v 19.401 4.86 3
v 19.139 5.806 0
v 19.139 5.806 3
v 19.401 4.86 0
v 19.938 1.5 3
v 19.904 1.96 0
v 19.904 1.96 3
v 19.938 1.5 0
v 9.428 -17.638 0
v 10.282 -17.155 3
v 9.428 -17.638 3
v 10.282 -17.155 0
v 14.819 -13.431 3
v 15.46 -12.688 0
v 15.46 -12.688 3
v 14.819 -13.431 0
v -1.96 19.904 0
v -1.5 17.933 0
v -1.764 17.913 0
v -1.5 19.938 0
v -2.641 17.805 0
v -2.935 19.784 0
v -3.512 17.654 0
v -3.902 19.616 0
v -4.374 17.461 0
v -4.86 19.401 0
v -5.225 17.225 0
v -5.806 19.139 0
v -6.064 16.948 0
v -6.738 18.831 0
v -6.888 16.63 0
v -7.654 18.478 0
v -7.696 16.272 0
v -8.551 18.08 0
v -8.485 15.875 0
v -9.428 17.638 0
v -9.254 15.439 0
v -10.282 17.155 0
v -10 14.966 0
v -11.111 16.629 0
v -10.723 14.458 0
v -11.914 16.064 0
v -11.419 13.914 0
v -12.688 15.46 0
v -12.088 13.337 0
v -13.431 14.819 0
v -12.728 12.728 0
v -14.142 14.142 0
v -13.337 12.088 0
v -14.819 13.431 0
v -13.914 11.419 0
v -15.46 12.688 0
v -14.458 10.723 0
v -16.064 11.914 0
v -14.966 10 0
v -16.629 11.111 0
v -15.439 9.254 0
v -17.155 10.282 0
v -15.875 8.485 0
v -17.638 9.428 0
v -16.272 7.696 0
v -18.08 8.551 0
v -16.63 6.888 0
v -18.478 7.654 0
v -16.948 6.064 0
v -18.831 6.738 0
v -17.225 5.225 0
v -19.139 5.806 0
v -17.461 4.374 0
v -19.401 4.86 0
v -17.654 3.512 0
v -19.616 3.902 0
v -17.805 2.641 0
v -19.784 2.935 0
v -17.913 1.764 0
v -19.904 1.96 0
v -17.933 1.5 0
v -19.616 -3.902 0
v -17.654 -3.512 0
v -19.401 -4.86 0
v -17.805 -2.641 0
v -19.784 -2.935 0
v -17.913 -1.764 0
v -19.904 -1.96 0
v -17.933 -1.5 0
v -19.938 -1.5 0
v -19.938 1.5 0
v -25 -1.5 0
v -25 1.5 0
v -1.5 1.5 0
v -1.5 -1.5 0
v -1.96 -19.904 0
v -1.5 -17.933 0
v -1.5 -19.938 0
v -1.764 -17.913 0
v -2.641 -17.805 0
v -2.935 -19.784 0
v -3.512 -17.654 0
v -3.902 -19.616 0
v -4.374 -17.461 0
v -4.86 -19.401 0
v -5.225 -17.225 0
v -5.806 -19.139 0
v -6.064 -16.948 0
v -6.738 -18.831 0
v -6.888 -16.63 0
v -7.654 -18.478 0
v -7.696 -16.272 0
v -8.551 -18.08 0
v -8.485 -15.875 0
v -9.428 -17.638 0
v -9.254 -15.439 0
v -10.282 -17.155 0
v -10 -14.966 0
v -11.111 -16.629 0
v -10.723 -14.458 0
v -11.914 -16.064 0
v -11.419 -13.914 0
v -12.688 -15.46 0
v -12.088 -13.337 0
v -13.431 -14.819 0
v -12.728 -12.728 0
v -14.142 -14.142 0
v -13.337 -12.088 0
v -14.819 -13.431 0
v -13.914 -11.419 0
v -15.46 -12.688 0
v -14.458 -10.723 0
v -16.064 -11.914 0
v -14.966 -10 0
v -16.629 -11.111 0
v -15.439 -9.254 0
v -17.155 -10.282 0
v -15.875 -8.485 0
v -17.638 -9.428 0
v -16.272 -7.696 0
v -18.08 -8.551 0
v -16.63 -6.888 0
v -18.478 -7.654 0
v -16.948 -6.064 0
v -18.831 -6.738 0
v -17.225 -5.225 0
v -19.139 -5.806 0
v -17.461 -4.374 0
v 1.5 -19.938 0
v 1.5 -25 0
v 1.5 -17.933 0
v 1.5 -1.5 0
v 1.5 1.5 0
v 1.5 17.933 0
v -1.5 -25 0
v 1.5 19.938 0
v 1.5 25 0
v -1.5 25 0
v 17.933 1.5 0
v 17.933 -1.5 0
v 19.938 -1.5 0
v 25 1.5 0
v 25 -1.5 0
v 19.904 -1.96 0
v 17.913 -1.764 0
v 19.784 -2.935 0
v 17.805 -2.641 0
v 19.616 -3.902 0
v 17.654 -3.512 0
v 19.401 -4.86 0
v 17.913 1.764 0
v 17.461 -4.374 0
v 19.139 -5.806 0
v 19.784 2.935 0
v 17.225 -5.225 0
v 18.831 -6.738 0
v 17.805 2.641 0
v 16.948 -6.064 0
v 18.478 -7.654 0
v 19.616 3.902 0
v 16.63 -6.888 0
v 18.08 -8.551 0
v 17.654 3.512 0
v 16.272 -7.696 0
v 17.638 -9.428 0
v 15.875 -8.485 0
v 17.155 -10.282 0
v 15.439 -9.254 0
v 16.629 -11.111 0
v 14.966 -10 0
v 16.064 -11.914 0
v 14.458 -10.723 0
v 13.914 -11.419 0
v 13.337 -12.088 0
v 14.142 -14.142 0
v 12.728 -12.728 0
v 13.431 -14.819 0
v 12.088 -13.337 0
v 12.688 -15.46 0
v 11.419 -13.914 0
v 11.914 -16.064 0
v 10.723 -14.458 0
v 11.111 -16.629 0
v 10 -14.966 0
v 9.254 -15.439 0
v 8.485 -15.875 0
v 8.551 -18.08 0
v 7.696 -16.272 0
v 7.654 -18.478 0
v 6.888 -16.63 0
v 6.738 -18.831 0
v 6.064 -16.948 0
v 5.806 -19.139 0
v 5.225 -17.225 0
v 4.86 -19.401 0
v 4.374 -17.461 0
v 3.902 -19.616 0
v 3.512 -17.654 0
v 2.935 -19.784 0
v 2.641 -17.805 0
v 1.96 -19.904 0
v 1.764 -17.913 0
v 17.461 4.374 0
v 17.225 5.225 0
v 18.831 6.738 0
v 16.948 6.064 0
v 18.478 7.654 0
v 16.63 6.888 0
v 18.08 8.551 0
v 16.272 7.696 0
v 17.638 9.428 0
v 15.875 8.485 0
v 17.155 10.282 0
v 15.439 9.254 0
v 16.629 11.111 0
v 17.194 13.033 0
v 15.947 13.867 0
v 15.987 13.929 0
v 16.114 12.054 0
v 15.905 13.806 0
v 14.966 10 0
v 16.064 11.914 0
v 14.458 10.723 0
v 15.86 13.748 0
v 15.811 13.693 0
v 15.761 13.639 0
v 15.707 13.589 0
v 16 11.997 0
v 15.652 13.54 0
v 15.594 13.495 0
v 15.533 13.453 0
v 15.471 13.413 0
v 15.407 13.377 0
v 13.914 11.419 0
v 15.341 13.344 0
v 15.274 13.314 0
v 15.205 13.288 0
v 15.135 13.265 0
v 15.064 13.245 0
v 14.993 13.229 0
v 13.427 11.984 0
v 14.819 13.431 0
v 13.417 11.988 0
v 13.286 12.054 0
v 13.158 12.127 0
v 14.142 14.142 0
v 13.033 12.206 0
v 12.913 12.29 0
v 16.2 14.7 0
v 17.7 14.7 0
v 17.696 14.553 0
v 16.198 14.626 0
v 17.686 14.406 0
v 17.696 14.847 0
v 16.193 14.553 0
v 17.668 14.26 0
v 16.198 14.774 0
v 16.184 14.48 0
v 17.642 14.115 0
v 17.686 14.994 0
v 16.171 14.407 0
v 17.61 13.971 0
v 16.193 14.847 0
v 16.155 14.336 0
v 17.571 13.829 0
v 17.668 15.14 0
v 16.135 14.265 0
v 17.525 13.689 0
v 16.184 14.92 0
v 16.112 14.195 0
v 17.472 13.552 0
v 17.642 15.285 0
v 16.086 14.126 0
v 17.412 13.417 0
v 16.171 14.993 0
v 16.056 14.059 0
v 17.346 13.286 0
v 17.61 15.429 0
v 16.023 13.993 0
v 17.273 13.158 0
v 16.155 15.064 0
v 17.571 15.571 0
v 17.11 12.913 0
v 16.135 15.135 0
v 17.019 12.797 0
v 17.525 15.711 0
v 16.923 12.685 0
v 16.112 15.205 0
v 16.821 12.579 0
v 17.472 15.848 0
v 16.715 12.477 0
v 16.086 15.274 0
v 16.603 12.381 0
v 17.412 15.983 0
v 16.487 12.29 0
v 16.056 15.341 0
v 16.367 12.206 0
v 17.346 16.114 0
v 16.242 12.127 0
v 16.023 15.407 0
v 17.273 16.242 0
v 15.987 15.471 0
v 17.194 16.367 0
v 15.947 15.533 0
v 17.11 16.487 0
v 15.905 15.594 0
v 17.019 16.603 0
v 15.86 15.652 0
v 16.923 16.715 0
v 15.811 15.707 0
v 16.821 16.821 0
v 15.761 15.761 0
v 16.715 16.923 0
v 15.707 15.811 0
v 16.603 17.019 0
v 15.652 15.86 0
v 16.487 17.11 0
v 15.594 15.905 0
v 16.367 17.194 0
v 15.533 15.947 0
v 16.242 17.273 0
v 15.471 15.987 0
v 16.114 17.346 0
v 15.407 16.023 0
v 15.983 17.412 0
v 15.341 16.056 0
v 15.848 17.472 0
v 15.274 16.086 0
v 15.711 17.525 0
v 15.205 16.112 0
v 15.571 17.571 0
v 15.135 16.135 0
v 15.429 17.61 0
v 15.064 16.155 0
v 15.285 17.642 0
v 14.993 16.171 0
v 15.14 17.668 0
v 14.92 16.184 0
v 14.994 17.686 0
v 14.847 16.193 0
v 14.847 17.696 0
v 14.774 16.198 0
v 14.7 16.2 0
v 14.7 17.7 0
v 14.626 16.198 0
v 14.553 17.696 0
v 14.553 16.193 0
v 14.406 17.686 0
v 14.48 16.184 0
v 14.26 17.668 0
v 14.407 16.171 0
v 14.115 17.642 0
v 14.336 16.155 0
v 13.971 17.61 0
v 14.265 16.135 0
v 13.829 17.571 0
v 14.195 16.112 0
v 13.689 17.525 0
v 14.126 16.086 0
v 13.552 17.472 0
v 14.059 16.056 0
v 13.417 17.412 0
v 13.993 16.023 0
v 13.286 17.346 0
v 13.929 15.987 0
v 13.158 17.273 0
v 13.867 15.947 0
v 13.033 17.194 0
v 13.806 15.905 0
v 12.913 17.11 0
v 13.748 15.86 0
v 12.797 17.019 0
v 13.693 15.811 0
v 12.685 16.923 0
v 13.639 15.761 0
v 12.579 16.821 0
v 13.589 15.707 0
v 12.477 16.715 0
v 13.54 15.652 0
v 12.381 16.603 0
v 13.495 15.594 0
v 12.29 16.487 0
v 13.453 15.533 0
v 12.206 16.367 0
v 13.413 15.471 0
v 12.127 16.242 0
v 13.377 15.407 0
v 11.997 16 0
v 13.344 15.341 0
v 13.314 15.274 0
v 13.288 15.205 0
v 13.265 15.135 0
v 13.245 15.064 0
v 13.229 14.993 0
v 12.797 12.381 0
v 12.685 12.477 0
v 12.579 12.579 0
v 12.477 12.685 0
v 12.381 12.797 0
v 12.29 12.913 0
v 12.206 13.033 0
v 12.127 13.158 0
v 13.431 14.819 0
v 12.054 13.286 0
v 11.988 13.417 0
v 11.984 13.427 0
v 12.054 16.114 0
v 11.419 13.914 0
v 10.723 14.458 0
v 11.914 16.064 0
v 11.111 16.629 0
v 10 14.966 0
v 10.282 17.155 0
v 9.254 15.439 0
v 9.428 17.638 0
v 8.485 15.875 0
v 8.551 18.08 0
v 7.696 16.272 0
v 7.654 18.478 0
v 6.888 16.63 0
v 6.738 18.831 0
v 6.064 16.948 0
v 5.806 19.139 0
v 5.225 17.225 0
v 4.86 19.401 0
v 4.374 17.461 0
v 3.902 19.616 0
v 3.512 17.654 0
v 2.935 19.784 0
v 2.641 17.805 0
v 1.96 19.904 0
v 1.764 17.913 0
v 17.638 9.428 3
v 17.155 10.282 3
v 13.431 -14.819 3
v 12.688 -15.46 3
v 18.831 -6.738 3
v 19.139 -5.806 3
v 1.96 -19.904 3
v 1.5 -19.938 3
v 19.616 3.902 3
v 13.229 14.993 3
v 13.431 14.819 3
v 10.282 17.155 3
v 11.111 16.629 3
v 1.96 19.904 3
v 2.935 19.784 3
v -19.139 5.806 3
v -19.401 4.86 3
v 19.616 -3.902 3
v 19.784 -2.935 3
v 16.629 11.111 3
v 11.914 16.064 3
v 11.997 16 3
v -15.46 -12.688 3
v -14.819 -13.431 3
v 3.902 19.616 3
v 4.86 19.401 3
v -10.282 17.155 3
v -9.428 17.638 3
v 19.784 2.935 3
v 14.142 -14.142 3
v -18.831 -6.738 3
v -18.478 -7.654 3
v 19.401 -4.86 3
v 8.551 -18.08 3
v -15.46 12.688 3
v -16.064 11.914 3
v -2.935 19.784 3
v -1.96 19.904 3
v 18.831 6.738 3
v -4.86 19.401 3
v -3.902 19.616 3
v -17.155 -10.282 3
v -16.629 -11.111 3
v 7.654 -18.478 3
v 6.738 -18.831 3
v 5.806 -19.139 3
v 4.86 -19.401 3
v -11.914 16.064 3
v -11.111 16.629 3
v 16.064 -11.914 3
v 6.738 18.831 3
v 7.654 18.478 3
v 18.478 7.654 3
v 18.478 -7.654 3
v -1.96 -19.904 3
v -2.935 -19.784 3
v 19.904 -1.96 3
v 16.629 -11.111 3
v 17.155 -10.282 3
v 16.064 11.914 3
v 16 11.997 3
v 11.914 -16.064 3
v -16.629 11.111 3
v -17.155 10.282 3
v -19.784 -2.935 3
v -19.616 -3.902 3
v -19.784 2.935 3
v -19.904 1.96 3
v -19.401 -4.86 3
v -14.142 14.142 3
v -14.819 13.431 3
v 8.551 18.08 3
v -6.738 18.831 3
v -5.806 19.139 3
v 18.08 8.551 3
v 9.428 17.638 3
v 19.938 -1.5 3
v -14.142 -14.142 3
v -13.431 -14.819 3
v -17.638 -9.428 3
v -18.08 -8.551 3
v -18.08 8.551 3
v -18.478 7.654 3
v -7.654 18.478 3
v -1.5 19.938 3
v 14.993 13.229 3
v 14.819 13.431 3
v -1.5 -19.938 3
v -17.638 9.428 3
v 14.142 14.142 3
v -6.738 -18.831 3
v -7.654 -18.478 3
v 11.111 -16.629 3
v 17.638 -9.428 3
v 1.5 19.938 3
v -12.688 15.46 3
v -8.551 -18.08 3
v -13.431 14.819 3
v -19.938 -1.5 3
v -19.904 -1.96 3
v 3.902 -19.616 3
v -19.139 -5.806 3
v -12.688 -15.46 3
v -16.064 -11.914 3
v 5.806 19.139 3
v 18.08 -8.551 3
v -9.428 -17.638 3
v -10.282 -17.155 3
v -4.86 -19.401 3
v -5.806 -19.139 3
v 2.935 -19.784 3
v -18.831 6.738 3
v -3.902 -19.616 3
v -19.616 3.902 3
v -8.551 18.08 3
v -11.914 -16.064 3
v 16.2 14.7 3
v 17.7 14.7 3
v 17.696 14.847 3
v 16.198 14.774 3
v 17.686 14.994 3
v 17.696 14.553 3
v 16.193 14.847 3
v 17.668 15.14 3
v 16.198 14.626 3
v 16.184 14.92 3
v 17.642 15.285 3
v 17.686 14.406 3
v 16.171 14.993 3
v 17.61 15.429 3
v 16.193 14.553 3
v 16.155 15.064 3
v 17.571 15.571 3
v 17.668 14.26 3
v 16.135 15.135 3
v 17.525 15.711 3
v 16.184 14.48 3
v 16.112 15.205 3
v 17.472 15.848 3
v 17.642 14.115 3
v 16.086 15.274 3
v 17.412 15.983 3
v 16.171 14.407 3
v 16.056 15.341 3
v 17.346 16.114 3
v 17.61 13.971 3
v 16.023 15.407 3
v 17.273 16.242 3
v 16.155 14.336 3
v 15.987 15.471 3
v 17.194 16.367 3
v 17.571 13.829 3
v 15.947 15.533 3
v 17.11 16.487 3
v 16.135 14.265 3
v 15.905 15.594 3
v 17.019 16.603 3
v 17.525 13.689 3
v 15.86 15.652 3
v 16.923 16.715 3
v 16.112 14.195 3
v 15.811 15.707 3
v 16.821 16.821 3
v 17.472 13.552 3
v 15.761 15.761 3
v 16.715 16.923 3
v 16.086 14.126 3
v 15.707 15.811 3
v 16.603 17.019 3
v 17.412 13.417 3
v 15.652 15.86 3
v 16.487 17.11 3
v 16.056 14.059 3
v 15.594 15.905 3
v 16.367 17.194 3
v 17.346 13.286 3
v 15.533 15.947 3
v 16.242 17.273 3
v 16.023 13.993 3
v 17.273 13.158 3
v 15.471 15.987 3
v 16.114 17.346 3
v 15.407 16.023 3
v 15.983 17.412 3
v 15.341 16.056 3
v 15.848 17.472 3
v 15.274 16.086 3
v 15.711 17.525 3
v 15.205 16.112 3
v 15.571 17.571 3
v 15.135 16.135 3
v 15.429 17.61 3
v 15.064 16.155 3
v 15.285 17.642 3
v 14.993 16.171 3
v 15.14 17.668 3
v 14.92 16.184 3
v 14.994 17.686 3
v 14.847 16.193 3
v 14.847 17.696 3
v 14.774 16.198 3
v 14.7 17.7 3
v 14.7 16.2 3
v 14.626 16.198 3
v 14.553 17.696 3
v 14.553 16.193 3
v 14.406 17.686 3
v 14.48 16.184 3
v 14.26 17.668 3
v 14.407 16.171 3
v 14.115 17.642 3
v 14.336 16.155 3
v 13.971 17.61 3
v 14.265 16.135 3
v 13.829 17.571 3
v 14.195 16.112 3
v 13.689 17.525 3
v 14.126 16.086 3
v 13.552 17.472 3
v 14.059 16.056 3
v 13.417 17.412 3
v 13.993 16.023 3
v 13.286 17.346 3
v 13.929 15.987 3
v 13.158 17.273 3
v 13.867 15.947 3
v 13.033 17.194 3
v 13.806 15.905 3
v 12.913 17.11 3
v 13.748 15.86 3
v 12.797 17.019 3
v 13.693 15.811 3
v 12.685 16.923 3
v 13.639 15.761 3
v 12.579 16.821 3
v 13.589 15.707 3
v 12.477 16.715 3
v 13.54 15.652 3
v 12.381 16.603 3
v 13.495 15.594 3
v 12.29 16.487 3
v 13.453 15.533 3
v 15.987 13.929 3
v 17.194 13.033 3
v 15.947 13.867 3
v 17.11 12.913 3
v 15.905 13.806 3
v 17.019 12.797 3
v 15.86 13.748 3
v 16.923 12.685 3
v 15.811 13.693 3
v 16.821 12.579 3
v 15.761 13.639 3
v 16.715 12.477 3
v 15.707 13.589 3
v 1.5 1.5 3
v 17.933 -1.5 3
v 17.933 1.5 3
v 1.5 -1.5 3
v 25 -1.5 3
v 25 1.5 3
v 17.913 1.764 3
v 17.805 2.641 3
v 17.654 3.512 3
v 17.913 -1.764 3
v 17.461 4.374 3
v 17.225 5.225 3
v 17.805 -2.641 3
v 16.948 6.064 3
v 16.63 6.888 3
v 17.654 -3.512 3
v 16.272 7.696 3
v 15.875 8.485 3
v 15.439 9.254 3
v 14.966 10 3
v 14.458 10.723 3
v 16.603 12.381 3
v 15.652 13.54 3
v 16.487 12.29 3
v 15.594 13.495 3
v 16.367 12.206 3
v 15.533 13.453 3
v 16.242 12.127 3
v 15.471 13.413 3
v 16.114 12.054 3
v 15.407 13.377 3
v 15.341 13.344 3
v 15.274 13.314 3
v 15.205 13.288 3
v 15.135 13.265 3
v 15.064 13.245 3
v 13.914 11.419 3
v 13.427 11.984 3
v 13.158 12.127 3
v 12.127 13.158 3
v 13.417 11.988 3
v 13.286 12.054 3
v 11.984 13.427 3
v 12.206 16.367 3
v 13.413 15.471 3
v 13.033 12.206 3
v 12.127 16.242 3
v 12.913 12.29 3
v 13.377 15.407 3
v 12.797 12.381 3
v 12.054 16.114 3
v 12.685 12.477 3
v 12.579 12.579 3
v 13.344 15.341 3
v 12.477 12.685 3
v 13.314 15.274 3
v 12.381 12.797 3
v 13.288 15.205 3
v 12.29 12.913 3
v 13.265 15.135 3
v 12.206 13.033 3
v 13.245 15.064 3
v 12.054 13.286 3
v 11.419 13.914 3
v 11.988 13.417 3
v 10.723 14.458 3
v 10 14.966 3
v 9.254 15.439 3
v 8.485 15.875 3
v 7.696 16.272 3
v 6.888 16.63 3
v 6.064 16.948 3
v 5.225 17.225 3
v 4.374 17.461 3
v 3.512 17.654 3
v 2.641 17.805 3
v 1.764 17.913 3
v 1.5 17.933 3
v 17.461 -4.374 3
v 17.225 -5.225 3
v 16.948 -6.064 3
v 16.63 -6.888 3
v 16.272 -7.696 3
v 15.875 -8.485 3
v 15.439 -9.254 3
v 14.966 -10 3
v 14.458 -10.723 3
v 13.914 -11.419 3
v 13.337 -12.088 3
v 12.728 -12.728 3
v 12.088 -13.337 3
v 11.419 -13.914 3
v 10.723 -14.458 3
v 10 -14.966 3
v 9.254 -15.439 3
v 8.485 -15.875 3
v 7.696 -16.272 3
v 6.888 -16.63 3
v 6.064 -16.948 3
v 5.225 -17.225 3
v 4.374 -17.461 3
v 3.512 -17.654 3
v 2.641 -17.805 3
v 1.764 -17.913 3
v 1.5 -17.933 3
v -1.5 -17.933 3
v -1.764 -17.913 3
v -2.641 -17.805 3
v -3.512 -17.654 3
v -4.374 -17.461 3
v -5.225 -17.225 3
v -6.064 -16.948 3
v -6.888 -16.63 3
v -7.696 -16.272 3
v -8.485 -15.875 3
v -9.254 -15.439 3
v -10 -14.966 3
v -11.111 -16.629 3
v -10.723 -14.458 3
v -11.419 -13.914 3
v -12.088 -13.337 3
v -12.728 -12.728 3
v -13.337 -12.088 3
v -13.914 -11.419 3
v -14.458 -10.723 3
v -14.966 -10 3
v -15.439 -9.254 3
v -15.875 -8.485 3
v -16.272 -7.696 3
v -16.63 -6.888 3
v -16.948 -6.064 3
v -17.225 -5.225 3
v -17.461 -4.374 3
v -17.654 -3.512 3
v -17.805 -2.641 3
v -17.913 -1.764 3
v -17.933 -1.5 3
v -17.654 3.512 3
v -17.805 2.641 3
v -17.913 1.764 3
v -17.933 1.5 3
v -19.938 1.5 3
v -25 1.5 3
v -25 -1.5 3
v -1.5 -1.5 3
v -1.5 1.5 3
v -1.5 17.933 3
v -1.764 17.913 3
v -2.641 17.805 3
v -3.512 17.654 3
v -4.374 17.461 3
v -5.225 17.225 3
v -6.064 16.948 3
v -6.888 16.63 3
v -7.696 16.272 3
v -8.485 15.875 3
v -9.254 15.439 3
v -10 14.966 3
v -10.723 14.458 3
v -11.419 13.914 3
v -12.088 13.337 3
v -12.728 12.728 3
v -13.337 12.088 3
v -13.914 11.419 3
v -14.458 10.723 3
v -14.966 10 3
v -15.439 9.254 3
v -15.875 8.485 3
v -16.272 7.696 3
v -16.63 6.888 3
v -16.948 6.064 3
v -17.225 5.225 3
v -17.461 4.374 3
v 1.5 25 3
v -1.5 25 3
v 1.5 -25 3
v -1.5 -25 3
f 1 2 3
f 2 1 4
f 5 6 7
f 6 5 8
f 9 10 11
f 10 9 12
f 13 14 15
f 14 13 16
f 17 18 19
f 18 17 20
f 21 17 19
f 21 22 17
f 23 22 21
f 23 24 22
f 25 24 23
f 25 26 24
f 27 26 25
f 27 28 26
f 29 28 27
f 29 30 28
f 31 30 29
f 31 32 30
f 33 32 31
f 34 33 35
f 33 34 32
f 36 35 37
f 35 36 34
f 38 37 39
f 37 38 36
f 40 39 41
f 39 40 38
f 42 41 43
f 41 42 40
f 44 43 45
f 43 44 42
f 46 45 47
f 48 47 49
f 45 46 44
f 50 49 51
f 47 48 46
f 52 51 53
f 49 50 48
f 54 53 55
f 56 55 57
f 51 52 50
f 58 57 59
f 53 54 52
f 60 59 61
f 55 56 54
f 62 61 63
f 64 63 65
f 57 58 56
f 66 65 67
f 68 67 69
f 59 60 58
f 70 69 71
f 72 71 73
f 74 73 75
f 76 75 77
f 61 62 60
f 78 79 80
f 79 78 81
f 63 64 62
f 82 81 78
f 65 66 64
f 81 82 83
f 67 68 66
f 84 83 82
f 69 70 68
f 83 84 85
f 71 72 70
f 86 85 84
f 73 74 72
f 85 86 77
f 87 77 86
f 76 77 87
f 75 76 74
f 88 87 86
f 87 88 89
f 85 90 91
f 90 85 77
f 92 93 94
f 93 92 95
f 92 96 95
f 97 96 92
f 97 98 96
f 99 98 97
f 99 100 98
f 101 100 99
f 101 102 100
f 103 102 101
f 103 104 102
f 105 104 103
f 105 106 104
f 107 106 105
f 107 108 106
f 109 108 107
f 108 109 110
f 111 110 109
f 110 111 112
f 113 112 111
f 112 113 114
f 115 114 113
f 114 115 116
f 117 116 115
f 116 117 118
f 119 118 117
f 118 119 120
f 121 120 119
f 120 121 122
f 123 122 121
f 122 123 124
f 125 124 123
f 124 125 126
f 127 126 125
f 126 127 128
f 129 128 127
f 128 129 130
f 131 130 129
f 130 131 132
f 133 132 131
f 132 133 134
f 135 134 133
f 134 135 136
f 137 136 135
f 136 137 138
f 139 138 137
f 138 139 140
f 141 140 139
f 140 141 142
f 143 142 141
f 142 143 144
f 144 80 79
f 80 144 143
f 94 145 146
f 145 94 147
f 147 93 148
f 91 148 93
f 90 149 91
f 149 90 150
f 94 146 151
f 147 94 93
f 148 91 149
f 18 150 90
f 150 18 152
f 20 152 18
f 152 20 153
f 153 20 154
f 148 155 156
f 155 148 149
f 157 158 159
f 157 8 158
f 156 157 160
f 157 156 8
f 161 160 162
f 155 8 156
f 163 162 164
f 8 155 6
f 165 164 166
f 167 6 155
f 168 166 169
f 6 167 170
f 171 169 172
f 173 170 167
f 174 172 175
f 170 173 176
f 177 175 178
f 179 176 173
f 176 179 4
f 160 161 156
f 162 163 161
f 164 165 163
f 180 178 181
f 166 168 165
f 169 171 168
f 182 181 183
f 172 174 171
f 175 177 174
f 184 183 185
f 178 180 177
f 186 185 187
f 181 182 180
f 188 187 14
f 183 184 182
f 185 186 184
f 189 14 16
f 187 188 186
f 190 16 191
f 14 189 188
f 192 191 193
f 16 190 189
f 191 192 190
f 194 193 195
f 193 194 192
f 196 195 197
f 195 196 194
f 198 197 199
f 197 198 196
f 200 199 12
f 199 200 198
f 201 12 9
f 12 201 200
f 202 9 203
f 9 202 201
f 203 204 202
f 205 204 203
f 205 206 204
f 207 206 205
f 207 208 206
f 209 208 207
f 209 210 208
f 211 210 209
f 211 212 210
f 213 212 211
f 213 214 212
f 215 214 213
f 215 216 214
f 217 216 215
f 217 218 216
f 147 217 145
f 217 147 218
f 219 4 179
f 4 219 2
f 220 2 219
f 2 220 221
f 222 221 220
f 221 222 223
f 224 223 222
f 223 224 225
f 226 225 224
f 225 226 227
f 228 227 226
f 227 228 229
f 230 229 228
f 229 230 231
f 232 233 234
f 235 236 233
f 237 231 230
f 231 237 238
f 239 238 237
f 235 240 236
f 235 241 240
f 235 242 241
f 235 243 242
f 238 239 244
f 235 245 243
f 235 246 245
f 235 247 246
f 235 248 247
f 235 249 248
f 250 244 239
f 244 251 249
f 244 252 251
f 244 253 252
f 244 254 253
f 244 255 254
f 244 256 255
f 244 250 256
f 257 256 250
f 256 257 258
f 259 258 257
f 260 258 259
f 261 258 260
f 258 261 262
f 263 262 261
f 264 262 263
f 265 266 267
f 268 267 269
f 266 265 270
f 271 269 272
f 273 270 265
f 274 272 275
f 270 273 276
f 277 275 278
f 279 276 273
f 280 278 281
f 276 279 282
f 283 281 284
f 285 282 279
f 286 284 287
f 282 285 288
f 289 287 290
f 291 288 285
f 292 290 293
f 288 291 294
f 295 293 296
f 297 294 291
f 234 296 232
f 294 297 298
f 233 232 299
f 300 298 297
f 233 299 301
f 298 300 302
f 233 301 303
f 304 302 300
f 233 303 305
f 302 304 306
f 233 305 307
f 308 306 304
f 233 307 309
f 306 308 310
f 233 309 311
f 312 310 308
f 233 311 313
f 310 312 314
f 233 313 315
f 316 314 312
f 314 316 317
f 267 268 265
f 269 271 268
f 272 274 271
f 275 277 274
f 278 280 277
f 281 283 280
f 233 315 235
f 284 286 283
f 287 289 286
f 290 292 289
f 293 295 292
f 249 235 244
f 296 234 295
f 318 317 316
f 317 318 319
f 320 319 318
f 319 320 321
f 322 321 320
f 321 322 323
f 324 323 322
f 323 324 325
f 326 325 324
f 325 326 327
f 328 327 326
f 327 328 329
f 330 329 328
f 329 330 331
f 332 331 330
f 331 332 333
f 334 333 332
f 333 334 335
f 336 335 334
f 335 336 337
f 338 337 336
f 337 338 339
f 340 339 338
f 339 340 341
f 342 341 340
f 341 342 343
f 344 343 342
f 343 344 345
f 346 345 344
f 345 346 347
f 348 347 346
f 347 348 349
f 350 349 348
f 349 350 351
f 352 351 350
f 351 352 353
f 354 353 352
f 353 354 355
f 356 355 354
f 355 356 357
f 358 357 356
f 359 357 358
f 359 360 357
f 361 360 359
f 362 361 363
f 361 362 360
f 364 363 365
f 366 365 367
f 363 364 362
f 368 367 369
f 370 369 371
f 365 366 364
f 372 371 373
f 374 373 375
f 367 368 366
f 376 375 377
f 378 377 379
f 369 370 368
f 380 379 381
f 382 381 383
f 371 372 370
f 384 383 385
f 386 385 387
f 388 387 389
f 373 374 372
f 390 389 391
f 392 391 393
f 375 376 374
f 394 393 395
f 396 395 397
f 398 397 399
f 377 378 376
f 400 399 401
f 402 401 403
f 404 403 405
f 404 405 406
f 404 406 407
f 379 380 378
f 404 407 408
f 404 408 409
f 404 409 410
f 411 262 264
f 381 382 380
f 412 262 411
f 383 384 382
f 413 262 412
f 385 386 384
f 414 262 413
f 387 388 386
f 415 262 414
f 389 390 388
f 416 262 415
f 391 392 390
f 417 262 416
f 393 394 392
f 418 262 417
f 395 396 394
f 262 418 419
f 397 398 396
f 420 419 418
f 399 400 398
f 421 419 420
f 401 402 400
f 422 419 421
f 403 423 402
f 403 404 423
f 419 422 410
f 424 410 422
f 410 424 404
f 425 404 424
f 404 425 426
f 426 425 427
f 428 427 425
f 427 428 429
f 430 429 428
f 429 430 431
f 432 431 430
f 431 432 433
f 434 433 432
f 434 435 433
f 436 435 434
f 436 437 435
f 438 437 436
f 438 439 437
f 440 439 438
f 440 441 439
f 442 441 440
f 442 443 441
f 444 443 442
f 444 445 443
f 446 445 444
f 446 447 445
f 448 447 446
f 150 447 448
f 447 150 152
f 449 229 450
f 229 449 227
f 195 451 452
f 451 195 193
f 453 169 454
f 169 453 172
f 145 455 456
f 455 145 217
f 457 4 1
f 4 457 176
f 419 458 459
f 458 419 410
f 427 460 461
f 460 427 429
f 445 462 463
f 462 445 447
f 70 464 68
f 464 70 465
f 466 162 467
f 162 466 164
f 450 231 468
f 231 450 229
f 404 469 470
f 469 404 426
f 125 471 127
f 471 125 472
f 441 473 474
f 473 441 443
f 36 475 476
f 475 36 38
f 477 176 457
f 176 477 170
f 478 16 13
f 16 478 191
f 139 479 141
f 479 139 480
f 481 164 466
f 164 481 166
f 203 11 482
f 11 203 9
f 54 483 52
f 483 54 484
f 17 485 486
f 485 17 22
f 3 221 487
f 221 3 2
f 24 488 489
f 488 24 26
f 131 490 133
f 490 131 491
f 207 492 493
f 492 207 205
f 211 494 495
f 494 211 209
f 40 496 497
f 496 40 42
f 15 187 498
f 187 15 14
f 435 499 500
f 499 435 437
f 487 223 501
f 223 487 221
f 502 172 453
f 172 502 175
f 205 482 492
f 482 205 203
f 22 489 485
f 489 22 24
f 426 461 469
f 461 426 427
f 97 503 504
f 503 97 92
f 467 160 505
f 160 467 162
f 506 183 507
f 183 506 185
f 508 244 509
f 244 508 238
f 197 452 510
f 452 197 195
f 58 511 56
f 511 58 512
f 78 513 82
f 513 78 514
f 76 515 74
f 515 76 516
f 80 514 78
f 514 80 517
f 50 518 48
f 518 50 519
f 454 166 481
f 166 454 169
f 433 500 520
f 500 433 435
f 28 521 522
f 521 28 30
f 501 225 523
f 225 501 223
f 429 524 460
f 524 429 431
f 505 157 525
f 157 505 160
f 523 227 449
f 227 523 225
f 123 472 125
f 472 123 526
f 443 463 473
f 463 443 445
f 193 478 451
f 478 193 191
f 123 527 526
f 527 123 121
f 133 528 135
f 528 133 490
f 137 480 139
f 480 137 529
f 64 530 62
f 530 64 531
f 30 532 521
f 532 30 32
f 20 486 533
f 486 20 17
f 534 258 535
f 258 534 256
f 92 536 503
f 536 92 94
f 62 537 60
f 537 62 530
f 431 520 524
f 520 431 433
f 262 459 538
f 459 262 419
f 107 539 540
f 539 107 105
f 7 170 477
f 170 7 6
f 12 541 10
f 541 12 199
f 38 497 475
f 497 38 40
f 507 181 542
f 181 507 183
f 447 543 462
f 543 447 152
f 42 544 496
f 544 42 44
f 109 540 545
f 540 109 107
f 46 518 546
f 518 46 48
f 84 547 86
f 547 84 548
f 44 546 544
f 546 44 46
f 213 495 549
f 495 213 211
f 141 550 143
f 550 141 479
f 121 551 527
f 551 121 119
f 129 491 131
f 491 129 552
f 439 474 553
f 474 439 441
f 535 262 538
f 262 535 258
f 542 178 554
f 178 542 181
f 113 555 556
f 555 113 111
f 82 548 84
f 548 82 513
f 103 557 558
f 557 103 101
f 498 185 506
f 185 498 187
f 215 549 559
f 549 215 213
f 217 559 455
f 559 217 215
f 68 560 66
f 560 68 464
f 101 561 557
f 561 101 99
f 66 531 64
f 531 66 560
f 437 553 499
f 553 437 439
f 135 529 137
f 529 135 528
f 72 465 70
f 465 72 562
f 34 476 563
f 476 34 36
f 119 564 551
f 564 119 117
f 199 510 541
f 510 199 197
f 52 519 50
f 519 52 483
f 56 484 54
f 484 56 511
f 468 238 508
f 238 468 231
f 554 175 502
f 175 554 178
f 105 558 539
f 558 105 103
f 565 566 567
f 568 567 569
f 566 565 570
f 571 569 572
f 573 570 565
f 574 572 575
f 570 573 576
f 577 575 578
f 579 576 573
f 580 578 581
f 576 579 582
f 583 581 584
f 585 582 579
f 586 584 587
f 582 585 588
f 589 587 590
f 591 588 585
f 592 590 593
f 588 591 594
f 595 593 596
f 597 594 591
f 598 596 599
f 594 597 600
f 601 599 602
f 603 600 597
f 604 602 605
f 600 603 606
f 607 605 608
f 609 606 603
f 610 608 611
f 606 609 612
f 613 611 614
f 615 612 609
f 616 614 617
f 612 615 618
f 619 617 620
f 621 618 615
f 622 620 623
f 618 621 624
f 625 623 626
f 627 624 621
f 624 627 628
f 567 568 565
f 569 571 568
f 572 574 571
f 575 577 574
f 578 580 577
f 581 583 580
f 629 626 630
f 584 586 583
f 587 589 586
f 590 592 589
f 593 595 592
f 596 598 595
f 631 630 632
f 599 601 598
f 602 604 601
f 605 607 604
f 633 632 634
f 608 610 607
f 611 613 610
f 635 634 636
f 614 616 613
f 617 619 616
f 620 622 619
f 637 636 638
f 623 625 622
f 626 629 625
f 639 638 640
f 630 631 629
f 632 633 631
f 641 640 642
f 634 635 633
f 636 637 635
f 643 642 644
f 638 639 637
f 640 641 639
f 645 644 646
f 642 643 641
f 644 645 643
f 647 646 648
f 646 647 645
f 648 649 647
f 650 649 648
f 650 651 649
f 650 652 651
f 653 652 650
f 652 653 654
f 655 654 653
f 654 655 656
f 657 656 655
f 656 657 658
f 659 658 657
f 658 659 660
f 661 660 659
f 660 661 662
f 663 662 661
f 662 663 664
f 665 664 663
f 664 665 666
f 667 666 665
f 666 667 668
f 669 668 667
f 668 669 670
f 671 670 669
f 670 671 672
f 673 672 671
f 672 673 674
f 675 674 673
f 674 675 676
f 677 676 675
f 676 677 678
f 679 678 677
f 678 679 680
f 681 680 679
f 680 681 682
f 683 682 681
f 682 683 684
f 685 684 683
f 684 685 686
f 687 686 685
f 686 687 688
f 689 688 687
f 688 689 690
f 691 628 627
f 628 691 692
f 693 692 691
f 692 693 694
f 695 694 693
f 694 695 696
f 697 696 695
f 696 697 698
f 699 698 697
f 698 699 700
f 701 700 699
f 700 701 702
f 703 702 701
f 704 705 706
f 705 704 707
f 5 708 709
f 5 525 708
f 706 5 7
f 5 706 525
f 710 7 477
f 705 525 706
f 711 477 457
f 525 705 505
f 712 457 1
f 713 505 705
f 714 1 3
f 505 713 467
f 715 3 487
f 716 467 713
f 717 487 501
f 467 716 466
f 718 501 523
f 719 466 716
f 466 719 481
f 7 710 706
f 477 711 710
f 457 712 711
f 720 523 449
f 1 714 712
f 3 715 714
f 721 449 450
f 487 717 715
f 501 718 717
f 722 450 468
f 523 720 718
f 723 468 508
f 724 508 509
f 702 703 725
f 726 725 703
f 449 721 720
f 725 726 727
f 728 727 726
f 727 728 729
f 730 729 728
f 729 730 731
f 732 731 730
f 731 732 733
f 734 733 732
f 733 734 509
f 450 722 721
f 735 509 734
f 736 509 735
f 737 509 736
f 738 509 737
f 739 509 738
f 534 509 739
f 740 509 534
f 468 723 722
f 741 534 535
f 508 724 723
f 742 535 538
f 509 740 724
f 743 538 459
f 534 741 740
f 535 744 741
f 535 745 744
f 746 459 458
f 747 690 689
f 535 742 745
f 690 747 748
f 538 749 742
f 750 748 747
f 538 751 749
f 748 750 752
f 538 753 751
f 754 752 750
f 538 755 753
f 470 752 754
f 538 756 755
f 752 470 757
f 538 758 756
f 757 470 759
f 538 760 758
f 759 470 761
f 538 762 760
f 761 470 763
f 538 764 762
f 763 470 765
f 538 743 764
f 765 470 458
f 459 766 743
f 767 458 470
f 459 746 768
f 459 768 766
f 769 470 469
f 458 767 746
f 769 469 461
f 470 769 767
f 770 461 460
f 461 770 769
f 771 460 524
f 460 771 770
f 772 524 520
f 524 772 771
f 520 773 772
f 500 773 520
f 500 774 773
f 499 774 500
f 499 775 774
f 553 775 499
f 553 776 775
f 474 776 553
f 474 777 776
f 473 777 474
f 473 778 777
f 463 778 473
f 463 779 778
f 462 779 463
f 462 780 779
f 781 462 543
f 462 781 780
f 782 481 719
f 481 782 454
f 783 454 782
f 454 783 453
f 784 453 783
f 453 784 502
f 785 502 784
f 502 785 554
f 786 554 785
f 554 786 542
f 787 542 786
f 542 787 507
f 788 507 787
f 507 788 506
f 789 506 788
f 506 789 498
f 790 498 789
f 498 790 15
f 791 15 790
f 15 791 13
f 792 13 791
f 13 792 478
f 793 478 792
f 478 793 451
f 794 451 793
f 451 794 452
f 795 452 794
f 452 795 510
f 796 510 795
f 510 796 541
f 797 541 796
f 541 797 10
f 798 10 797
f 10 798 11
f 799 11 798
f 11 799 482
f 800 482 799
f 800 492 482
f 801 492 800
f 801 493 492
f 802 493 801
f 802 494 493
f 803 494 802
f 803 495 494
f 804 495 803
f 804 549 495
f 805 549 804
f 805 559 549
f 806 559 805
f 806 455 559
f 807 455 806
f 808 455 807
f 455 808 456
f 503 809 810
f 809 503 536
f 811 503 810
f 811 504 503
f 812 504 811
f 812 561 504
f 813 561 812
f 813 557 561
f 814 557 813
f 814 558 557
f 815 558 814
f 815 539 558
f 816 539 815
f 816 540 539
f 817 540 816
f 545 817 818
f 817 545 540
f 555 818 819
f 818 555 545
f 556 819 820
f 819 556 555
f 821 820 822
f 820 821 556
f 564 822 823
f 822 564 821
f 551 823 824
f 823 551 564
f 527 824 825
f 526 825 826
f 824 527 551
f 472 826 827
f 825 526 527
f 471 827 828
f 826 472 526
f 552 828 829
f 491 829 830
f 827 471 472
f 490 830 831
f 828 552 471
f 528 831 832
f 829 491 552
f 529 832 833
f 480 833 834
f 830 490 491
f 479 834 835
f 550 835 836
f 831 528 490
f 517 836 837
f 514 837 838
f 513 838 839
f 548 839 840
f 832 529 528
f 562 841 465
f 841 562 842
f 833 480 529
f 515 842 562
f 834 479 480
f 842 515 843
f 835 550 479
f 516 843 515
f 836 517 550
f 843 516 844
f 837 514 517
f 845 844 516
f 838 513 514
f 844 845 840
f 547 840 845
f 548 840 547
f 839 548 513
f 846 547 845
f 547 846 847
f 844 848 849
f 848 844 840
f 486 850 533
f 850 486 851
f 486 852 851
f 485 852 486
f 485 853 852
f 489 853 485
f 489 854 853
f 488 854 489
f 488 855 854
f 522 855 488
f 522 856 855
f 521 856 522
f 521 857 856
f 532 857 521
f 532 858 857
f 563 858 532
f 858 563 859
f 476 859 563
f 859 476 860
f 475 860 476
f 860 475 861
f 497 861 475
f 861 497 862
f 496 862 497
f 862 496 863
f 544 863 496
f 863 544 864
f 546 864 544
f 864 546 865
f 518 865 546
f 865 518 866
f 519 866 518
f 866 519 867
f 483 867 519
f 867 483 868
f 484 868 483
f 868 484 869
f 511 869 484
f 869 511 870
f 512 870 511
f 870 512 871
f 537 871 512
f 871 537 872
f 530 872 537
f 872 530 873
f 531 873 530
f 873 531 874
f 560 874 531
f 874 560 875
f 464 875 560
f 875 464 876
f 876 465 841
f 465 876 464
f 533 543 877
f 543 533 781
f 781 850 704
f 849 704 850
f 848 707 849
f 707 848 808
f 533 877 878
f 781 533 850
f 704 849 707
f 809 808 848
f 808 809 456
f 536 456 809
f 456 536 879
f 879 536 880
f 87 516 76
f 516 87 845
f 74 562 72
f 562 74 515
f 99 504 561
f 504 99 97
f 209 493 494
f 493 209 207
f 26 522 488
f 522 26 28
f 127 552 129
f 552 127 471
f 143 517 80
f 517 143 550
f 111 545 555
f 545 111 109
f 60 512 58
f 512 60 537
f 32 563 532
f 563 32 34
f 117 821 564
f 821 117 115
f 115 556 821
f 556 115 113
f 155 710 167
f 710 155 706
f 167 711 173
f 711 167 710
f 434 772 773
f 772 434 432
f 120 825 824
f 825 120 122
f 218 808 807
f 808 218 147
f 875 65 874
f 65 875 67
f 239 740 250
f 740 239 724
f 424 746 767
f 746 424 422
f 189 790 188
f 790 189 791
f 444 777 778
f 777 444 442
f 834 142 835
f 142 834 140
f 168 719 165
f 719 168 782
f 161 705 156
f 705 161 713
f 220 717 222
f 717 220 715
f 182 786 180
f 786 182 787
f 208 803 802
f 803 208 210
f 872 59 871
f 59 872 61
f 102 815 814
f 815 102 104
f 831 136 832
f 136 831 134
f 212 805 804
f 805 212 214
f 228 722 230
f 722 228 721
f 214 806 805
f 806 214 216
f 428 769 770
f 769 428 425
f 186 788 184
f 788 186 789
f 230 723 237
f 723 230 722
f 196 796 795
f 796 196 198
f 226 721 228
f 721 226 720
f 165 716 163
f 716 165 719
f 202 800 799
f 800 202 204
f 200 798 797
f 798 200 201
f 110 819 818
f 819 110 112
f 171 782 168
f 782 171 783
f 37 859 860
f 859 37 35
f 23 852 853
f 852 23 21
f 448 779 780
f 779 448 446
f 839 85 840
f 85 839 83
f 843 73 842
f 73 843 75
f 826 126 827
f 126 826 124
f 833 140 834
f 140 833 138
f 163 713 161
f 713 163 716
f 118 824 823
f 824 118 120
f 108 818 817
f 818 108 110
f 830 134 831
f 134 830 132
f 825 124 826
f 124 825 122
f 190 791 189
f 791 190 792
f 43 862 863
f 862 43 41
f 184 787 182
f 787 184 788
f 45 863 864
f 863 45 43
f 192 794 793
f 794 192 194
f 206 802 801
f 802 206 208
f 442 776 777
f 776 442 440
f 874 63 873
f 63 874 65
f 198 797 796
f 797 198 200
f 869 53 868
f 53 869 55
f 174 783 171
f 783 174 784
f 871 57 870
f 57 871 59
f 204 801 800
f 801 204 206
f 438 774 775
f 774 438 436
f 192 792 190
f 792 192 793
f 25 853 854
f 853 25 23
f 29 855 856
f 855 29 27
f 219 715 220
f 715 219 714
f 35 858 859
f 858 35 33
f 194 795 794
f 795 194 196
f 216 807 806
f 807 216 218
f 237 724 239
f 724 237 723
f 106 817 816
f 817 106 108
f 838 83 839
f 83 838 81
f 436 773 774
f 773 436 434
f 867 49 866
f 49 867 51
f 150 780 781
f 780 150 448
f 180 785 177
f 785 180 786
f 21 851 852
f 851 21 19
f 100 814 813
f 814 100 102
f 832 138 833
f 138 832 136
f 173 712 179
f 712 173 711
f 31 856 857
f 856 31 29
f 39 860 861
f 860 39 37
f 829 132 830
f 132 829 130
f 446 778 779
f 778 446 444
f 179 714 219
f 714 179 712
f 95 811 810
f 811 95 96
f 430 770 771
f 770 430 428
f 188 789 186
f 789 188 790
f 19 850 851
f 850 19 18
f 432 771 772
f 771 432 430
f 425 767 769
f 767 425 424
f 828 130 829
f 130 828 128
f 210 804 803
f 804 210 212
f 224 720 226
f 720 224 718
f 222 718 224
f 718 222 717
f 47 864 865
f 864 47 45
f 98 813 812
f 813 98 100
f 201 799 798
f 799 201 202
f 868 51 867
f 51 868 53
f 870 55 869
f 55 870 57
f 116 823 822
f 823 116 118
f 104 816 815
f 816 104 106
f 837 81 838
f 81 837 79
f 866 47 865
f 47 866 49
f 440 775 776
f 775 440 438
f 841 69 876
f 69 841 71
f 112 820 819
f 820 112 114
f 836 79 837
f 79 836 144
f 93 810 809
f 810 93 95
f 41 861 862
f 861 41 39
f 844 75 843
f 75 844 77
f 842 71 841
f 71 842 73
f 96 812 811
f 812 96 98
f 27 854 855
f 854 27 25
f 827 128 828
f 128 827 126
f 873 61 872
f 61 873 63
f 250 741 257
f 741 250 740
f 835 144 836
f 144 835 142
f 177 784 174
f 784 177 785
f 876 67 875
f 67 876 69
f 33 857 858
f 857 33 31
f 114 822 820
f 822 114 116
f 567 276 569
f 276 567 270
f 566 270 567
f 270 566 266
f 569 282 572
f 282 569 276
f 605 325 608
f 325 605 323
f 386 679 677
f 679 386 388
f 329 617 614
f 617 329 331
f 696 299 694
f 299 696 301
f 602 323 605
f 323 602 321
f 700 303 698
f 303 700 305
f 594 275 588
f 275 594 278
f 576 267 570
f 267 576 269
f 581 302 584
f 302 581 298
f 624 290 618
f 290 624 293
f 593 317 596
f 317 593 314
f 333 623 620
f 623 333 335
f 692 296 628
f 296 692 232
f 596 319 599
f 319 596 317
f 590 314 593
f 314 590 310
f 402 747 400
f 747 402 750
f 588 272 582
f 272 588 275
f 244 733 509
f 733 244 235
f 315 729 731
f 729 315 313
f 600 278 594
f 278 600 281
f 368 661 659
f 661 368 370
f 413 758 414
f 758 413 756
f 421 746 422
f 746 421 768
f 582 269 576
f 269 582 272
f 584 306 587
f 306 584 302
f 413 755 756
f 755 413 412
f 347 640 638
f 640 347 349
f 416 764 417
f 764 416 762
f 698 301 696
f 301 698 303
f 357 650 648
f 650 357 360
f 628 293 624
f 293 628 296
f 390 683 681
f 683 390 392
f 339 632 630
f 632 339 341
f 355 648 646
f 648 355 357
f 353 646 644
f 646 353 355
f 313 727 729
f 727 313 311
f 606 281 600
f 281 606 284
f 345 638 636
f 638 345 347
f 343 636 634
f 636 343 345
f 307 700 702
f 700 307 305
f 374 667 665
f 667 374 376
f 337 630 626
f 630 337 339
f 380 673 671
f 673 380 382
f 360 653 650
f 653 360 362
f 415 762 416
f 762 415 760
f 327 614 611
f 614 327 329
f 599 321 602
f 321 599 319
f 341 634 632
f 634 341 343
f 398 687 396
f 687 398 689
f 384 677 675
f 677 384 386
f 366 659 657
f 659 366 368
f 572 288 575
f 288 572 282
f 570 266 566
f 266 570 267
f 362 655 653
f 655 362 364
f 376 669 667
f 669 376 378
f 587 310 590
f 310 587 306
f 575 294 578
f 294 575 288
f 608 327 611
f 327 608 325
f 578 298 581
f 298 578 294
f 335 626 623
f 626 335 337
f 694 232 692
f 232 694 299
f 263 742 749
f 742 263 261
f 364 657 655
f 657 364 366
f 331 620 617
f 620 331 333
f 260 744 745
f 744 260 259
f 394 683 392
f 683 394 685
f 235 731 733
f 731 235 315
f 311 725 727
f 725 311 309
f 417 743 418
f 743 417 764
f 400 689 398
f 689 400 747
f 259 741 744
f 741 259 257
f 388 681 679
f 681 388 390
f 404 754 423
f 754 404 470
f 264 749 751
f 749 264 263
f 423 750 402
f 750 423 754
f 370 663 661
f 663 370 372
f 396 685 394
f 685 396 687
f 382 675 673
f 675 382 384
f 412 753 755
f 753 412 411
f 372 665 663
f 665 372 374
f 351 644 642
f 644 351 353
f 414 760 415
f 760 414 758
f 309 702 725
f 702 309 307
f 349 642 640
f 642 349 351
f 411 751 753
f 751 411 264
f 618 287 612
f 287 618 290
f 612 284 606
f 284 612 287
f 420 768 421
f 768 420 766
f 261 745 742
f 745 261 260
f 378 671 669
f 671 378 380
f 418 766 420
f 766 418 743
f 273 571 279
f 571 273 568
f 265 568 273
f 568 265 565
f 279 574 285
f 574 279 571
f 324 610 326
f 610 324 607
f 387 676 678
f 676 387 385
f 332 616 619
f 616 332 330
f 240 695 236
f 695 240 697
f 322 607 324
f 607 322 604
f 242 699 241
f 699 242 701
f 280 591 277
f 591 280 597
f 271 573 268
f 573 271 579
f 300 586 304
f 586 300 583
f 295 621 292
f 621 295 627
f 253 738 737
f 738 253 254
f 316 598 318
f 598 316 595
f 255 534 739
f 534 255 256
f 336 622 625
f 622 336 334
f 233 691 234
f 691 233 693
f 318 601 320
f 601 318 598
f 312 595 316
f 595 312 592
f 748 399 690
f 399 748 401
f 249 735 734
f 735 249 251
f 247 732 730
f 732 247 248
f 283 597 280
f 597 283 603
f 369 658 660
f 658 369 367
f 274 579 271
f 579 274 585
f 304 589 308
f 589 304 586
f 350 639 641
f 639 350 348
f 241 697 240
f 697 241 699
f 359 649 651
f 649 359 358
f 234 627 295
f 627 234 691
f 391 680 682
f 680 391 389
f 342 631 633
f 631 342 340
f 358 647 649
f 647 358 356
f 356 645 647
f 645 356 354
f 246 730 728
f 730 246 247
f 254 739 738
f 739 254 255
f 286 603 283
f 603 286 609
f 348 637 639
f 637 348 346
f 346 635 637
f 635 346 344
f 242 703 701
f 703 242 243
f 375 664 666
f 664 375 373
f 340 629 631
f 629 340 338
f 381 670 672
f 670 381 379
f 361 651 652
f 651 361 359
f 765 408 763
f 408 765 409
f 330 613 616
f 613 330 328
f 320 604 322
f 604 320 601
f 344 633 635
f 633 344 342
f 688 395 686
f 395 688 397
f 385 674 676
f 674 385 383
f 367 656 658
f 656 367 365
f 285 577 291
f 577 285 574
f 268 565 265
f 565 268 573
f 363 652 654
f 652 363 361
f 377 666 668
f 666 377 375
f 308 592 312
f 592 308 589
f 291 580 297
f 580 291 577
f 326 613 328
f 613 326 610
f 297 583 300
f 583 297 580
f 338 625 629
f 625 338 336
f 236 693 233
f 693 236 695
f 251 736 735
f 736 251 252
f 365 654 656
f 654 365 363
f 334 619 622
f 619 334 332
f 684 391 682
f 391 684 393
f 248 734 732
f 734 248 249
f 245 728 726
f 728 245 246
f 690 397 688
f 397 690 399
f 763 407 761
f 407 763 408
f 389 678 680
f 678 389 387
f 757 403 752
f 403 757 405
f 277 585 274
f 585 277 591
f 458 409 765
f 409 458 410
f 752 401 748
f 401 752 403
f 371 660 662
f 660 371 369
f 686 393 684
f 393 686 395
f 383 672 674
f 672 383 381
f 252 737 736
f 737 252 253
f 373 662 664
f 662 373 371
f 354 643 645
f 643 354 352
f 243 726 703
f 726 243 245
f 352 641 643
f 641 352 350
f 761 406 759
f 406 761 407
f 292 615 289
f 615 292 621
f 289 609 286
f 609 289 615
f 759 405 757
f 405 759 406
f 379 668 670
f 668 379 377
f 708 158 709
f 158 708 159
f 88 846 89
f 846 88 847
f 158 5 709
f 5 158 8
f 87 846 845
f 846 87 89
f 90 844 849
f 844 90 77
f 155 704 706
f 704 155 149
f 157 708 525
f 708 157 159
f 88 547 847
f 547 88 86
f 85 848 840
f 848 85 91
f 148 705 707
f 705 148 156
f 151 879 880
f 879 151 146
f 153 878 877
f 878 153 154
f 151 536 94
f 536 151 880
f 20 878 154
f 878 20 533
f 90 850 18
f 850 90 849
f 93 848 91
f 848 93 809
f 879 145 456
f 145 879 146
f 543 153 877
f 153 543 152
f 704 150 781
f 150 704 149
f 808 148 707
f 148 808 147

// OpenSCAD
 //pendant
 $fn=128;
 difference(){
 cylinder(3,20,20);
 cylinder(3,18,18);
}
 rotate([0, 90, 0])   translate([-3, -1.5, -25]) cube([3, 3, 50]);
 rotate([90, 90, 0])  translate([-3, -1.5, -25]) cube([3, 3, 50]);
 difference(){
 translate([14.7, 14.7, 0])  cylinder(3, 3, 3);
  translate([14.7, 14.7, 0]) cylinder(3, 1.5, 1.5);
}
